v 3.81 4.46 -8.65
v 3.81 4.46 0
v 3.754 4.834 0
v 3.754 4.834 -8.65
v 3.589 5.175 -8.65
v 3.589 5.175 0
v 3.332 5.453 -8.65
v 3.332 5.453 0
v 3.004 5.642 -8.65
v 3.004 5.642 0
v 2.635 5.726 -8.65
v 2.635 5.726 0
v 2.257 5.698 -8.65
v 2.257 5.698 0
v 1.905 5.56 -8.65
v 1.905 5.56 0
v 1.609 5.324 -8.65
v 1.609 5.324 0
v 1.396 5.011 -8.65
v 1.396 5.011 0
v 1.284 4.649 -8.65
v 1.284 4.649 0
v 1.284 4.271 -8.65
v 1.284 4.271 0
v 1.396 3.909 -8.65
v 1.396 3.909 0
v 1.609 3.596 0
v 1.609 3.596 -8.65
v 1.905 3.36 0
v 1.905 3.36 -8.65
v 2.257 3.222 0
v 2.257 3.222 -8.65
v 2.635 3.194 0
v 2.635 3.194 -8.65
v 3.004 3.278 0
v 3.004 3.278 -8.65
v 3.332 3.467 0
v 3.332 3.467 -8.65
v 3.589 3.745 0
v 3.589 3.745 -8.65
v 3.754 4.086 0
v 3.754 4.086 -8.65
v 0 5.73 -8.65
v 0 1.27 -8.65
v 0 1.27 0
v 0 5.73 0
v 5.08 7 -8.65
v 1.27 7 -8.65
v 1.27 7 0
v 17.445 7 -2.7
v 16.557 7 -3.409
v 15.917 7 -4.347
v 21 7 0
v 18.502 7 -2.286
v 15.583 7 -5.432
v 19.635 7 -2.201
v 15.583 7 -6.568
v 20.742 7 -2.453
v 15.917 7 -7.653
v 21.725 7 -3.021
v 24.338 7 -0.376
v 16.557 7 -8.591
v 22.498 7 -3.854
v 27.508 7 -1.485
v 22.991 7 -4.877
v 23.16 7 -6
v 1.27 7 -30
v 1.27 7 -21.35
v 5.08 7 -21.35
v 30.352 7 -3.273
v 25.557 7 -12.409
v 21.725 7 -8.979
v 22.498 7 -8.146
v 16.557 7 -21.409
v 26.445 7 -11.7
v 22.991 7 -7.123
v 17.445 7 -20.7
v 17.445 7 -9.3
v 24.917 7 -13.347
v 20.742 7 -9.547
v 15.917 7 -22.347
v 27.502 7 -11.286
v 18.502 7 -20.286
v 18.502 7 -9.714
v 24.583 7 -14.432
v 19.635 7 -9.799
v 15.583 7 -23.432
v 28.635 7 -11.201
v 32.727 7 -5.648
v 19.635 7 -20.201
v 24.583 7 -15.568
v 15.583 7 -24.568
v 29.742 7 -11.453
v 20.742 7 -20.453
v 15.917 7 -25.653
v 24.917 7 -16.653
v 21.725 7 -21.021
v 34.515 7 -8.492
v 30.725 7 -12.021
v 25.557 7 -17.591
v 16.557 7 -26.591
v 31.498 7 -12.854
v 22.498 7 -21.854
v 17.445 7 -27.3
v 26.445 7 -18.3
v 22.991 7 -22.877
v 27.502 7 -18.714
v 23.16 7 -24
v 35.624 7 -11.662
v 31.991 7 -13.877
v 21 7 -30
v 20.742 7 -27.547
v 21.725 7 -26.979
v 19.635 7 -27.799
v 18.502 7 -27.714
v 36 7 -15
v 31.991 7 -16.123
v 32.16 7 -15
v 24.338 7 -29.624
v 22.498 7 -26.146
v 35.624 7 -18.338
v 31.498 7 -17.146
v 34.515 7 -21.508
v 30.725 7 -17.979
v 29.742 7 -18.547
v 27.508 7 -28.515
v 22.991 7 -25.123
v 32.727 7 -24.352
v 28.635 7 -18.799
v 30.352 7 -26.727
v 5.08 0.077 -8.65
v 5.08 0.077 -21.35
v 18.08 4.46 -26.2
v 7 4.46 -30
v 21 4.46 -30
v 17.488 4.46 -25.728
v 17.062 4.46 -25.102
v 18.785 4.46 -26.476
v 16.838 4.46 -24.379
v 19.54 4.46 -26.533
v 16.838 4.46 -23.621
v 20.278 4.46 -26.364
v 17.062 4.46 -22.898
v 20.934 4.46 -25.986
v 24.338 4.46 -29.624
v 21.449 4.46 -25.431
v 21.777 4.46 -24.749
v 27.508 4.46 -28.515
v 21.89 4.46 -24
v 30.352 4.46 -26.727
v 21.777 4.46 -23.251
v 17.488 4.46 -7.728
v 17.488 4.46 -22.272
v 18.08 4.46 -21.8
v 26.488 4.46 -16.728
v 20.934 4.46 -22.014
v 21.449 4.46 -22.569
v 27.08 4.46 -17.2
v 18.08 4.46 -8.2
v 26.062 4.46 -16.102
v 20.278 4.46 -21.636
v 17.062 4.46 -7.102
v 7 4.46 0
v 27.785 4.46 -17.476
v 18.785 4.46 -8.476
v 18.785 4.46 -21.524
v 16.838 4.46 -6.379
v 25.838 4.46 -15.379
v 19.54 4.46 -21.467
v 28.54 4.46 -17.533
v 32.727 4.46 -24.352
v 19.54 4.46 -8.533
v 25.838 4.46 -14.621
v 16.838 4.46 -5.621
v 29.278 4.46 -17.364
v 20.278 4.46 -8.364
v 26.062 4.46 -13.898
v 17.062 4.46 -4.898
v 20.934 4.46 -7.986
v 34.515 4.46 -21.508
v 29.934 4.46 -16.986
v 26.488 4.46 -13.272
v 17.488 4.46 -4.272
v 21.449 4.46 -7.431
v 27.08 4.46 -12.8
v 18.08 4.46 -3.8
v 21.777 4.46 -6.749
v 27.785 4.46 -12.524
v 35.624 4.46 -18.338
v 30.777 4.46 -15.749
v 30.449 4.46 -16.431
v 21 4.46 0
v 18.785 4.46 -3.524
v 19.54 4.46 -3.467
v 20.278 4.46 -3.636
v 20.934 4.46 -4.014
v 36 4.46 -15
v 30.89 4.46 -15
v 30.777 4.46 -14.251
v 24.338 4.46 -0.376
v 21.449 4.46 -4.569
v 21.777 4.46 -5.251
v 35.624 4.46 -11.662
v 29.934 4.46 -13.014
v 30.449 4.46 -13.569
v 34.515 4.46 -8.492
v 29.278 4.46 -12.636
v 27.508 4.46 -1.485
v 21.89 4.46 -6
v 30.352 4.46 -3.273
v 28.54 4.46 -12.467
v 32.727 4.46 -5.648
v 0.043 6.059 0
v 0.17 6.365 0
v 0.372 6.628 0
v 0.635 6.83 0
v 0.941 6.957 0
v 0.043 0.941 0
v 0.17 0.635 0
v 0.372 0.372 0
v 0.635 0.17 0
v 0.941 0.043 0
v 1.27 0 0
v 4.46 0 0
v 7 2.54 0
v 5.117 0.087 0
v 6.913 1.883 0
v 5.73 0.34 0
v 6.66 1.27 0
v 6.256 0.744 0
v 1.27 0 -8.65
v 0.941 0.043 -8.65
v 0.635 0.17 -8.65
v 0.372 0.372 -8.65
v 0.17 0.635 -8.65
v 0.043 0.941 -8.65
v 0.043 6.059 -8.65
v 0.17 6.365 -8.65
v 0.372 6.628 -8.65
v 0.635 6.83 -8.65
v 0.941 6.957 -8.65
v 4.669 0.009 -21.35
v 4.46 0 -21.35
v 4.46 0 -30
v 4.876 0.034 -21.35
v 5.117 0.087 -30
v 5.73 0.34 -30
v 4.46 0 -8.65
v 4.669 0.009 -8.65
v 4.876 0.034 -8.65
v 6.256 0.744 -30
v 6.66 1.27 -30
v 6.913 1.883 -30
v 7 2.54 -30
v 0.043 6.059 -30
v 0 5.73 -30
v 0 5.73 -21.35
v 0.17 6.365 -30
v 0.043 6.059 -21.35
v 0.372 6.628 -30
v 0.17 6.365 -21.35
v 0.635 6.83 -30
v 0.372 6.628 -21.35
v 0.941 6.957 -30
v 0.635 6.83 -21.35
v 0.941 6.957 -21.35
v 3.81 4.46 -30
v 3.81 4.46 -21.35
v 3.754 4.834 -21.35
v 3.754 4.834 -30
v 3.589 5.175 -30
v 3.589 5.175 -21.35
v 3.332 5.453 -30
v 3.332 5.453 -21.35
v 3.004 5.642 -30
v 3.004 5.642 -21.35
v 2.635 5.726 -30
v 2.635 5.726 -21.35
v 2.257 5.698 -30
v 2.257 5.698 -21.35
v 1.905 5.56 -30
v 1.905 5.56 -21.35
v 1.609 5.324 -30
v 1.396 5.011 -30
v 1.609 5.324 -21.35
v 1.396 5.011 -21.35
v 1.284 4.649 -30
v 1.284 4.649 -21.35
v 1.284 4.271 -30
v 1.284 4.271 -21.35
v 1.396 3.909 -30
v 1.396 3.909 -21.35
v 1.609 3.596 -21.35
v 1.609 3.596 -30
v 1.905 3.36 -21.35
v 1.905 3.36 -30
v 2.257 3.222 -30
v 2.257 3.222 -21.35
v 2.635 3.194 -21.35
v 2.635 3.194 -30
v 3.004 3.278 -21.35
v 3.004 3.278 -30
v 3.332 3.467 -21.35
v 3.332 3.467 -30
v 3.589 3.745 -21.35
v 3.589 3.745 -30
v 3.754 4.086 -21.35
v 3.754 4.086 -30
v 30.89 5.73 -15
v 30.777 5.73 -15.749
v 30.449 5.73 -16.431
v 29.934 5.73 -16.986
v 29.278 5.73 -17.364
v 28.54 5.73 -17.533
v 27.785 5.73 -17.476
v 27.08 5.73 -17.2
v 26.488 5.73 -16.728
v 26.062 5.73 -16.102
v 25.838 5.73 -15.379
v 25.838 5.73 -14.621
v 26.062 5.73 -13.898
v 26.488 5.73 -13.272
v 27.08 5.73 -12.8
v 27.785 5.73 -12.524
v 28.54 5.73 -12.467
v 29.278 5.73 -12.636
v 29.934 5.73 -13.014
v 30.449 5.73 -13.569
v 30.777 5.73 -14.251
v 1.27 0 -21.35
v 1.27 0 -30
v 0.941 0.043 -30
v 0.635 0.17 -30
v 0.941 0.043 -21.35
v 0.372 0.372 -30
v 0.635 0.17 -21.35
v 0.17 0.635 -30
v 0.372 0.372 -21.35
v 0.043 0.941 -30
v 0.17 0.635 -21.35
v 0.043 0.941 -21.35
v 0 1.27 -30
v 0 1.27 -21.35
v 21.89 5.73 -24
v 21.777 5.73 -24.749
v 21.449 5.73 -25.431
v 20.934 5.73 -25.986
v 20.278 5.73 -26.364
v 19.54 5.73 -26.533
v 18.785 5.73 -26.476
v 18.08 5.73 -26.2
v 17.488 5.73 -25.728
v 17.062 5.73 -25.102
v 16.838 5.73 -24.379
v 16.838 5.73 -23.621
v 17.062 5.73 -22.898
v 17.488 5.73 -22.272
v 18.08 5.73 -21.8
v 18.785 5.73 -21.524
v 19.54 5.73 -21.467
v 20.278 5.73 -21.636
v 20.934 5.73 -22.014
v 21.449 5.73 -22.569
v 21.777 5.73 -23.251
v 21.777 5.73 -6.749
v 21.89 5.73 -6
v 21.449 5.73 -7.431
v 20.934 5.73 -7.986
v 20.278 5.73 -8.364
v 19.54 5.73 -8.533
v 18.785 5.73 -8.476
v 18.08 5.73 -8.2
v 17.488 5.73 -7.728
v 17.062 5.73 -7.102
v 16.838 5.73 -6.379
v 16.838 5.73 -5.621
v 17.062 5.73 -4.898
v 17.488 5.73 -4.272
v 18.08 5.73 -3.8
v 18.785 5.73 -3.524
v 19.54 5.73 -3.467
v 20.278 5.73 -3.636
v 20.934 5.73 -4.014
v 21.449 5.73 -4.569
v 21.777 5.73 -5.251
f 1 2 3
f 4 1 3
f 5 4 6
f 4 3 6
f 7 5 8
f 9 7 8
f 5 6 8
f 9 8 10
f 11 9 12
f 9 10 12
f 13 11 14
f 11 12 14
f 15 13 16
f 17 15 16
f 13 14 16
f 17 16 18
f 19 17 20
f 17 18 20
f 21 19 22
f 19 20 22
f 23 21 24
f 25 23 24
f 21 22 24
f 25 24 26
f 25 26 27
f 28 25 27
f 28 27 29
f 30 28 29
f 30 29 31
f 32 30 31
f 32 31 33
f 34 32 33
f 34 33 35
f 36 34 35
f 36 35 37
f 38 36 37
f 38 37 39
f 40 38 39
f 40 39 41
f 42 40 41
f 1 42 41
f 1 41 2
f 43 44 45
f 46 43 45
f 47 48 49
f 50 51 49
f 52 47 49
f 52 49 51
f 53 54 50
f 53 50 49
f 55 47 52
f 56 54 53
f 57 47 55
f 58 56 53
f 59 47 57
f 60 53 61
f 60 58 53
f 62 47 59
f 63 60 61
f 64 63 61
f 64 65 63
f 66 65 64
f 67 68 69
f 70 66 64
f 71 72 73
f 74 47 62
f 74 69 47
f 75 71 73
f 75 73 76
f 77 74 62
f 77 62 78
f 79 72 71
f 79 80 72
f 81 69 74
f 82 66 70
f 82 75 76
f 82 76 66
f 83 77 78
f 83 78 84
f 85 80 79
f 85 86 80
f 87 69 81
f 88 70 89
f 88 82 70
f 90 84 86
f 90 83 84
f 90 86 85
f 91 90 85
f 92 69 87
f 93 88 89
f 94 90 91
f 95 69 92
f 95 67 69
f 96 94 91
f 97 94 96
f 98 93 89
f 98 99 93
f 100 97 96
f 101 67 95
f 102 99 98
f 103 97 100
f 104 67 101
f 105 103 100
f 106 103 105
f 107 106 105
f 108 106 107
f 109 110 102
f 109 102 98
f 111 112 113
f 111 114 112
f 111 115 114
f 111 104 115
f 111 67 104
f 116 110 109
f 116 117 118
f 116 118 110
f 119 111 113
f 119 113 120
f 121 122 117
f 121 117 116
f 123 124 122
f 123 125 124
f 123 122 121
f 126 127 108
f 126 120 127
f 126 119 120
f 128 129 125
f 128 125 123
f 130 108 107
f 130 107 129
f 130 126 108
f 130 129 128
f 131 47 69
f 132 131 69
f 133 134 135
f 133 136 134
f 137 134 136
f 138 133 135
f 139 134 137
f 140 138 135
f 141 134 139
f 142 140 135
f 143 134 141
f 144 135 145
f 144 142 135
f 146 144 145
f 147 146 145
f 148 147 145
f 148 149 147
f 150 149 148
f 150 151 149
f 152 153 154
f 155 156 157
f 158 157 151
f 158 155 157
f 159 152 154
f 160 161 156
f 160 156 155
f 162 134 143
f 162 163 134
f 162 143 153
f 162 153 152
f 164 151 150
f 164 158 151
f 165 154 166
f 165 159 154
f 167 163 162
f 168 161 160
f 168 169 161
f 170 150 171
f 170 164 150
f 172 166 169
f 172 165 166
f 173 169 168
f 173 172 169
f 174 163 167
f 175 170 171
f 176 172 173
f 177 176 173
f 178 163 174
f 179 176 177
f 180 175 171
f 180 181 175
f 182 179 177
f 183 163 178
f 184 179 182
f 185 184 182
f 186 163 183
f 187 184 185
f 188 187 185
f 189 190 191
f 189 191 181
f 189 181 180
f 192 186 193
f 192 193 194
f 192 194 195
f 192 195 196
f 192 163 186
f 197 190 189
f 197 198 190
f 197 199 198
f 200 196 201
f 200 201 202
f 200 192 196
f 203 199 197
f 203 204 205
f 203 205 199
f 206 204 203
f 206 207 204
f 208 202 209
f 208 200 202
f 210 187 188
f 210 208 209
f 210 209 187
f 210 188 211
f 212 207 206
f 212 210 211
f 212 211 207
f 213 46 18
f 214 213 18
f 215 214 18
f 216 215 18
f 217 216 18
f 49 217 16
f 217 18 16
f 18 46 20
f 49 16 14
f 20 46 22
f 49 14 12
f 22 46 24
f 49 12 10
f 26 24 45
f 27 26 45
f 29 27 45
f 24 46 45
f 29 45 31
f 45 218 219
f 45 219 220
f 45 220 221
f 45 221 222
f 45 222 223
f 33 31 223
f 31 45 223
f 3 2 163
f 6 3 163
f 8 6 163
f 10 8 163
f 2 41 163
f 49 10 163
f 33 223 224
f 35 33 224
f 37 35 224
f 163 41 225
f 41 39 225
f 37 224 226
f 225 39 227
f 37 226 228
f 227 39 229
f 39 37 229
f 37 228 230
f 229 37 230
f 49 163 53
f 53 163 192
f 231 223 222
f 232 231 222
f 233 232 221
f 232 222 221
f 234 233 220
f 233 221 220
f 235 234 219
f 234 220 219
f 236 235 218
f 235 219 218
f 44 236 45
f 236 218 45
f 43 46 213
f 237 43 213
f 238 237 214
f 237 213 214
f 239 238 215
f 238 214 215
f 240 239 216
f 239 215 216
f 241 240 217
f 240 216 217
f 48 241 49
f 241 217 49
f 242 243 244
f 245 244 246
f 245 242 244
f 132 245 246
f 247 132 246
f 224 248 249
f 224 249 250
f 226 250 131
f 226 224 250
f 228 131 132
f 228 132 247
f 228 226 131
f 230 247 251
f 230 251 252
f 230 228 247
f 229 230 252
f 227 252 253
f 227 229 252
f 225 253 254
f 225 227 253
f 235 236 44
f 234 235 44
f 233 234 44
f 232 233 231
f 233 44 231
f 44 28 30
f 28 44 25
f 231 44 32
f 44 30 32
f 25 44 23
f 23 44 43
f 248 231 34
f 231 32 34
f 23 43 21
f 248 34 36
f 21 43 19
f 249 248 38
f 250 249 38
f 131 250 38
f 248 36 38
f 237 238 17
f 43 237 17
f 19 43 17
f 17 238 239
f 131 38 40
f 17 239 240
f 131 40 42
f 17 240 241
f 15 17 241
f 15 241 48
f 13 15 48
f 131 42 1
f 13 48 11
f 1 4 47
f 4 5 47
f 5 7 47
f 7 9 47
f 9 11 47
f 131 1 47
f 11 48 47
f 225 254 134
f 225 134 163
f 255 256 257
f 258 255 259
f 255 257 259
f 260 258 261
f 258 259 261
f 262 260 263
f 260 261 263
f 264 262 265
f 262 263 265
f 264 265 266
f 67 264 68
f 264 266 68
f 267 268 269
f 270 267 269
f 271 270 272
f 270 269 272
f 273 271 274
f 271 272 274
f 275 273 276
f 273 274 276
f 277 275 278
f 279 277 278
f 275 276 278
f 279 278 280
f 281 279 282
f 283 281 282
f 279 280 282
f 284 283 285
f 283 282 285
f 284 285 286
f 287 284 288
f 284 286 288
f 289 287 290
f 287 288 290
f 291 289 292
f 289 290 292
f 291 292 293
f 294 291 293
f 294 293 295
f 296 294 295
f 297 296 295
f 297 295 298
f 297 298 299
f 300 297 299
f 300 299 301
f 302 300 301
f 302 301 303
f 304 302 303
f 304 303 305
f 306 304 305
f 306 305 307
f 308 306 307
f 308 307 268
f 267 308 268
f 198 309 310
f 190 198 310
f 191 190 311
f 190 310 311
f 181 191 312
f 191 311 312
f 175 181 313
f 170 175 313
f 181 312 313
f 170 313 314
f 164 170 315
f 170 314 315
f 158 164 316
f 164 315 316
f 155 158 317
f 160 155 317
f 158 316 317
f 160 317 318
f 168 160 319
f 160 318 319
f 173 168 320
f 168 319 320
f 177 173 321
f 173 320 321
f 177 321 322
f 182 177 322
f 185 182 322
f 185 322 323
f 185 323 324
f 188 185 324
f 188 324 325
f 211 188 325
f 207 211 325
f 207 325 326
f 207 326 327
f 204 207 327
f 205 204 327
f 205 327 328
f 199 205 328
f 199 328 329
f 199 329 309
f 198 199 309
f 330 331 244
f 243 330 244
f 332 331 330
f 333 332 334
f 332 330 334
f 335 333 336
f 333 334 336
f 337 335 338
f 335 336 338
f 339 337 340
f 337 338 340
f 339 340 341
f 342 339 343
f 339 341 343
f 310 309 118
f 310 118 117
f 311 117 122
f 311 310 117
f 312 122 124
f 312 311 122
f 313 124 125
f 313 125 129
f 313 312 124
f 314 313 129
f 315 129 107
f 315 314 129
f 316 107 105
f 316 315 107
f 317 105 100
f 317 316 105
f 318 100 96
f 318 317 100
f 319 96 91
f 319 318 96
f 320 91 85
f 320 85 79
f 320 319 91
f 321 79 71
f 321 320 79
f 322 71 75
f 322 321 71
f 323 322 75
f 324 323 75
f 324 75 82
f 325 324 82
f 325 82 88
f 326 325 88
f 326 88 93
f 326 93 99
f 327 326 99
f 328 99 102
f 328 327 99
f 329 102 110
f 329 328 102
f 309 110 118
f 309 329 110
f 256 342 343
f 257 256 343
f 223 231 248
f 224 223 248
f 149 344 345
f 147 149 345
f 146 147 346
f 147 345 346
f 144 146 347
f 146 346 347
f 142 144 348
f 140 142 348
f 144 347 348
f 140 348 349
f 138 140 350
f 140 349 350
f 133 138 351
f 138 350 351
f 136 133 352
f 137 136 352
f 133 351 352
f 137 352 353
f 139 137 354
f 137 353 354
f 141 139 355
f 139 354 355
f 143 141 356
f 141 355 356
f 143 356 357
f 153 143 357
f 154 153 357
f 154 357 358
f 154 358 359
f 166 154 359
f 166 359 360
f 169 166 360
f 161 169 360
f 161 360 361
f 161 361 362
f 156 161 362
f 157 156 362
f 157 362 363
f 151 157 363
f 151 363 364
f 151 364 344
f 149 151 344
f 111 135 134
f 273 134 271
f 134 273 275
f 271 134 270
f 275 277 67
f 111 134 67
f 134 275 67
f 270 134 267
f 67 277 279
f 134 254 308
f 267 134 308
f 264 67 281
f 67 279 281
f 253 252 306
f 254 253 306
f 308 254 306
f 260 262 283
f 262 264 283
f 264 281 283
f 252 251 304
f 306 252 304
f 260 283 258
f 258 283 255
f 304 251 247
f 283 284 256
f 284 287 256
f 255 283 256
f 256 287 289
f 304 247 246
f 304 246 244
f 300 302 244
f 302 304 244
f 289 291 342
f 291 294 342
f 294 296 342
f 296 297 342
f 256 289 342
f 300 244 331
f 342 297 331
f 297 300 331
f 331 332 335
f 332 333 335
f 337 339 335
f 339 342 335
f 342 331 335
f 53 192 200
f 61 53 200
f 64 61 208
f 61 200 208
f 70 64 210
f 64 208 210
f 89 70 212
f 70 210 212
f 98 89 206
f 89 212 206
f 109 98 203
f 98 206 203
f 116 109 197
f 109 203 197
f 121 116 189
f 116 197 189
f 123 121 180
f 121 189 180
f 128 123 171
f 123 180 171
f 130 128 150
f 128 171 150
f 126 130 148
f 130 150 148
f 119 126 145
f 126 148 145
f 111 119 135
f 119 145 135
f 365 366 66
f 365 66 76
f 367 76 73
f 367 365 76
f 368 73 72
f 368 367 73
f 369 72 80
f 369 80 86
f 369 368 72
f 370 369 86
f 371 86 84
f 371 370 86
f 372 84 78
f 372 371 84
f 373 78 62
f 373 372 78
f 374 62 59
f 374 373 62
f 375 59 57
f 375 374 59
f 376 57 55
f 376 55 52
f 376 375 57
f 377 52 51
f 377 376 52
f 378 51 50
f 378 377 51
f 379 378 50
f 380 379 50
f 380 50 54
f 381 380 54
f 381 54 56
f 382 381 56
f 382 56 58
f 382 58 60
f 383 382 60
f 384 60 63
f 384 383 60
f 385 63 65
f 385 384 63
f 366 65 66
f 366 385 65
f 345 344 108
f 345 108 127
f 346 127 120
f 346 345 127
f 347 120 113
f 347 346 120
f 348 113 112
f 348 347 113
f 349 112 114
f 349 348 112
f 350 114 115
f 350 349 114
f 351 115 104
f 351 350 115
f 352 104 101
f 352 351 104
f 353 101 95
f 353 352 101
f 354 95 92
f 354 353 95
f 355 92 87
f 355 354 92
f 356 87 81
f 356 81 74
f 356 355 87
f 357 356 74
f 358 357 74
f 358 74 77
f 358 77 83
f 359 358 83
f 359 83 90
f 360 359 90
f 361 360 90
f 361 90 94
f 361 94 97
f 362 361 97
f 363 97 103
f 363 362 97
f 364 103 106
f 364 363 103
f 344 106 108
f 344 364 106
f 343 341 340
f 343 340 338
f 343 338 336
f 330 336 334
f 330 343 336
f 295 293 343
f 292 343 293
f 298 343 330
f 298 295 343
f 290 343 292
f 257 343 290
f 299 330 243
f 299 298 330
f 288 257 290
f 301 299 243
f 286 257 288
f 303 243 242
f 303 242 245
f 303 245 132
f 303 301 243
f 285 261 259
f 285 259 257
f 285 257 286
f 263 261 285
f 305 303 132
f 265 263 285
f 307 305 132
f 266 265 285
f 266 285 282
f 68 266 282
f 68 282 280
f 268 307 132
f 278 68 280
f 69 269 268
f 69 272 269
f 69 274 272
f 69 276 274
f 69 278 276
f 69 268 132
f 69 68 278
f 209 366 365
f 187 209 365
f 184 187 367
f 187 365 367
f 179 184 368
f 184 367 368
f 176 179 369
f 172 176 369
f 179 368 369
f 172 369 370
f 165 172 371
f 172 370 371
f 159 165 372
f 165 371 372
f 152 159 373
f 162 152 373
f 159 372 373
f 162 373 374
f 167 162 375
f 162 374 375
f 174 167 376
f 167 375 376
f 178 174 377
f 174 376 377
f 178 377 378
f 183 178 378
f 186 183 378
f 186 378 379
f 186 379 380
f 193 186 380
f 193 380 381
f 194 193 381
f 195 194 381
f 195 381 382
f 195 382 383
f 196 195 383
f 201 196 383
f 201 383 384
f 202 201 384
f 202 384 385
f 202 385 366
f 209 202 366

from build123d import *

# Parameters (mm, degrees)
BOSS_EXTRUDE1_DEPTH = 7
SKETCH2_W           = 29.216076644
SKETCH2_H           = 30
CUT_EXTRUDE1_DEPTH  = 4.46
FILLET1_R           = 2.54
FILLET2_R           = 1.27
CUT_EXTRUDE2_REACH  = 9
SKETCH3_R           = 2.54
SKETCH3_W           = 5.08
SKETCH3_H           = 12.7
CHAMFER1_SIZE       = 1.27
SKETCH4_R           = 1.27
CUT_EXTRUDE3_DEPTH  = 31


with BuildPart() as part:
    # Sketch1 → Boss-Extrude1 (new body)
    with BuildSketch(Plane(origin=(0, 0, 0), x_dir=(1, 0, 0), z_dir=(0, 1, 0))):
        with BuildLine():
            Line((0, 0), (21.000000028, 0))
            ThreePointArc((21.000000028, 0), (36.000000028, 15), (21.000000028, 30))
            Line((21.000000028, 30), (0, 30))
            Line((0, 30), (0, 0))
        make_face()
    extrude(amount=BOSS_EXTRUDE1_DEPTH)

    # Sketch2 → Cut-Extrude1 (cut)
    with BuildSketch(Plane.XZ):
        with Locations((21.608038322, -15)):
            Rectangle(SKETCH2_W, SKETCH2_H)
    extrude(amount=-CUT_EXTRUDE1_DEPTH, mode=Mode.SUBTRACT)

    # Fillet1
    fillet1_edges = [part.edges().sort_by_distance(p)[0] for p in [
        (7, 0, -15),
    ]]
    fillet(fillet1_edges, radius=FILLET1_R)

    # Fillet2
    fillet2_edges = [part.edges().sort_by_distance(p)[0] for p in [
        (0, 7, -15),
        (0, 0, -15),
    ]]
    fillet(fillet2_edges, radius=FILLET2_R)

    # Sketch3 → Cut-Extrude2 (cut, up to next)
    with BuildSketch(Plane(origin=(0, 7, 0), x_dir=(1, 0, 0), z_dir=(0, 1, 0)), mode=Mode.PRIVATE) as cut_extrude2_sk1:
        with Locations((28.34999918, 15)):
            Circle(SKETCH3_R)
    cut_extrude2_tool1 = extrude(cut_extrude2_sk1.sketch, amount=-CUT_EXTRUDE2_REACH, mode=Mode.PRIVATE) & part.part
    add(cut_extrude2_tool1.solids().sort_by_distance((28.349999, 7, -15))[0], mode=Mode.SUBTRACT)
    # Sketch3 → Cut-Extrude2 (cut, up to next)
    with BuildSketch(Plane(origin=(0, 7, 0), x_dir=(1, 0, 0), z_dir=(0, 1, 0)), mode=Mode.PRIVATE) as cut_extrude2_sk2:
        with Locations((19.3499994, 23.99999978)):
            Circle(SKETCH3_R)
    cut_extrude2_tool2 = extrude(cut_extrude2_sk2.sketch, amount=-CUT_EXTRUDE2_REACH, mode=Mode.PRIVATE) & part.part
    add(cut_extrude2_tool2.solids().sort_by_distance((19.349999, 7, -24))[0], mode=Mode.SUBTRACT)
    # Sketch3 → Cut-Extrude2 (cut, up to next)
    with BuildSketch(Plane(origin=(0, 7, 0), x_dir=(1, 0, 0), z_dir=(0, 1, 0)), mode=Mode.PRIVATE) as cut_extrude2_sk3:
        with Locations((19.3499994, 6.00000022)):
            Circle(SKETCH3_R)
    cut_extrude2_tool3 = extrude(cut_extrude2_sk3.sketch, amount=-CUT_EXTRUDE2_REACH, mode=Mode.PRIVATE) & part.part
    add(cut_extrude2_tool3.solids().sort_by_distance((19.349999, 7, -6))[0], mode=Mode.SUBTRACT)
    # Sketch3 → Cut-Extrude2 (cut, up to next)
    with BuildSketch(Plane(origin=(0, 7, 0), x_dir=(1, 0, 0), z_dir=(0, 1, 0)), mode=Mode.PRIVATE) as cut_extrude2_sk4:
        with Locations((2.54, 15)):
            Rectangle(SKETCH3_W, SKETCH3_H)
    cut_extrude2_tool4 = extrude(cut_extrude2_sk4.sketch, amount=-CUT_EXTRUDE2_REACH, mode=Mode.PRIVATE) & part.part
    add(cut_extrude2_tool4.solids().sort_by_distance((2.54, 7, -15))[0], mode=Mode.SUBTRACT)

    # Chamfer1
    chamfer1_edges = [part.edges().sort_by_distance(p)[0] for p in [
        (25.80999918, 7, -15),
        (16.8099994, 7, -23.99999978),
        (16.8099994, 7, -6.00000022),
    ]]
    chamfer(chamfer1_edges, length=CHAMFER1_SIZE)

    # Sketch4 → Cut-Extrude3 (cut, through all)
    with BuildSketch(Plane.XY):
        with Locations((2.54, 4.46)):
            Circle(SKETCH4_R)
    extrude(amount=-CUT_EXTRUDE3_DEPTH, mode=Mode.SUBTRACT)


solid = part.part
